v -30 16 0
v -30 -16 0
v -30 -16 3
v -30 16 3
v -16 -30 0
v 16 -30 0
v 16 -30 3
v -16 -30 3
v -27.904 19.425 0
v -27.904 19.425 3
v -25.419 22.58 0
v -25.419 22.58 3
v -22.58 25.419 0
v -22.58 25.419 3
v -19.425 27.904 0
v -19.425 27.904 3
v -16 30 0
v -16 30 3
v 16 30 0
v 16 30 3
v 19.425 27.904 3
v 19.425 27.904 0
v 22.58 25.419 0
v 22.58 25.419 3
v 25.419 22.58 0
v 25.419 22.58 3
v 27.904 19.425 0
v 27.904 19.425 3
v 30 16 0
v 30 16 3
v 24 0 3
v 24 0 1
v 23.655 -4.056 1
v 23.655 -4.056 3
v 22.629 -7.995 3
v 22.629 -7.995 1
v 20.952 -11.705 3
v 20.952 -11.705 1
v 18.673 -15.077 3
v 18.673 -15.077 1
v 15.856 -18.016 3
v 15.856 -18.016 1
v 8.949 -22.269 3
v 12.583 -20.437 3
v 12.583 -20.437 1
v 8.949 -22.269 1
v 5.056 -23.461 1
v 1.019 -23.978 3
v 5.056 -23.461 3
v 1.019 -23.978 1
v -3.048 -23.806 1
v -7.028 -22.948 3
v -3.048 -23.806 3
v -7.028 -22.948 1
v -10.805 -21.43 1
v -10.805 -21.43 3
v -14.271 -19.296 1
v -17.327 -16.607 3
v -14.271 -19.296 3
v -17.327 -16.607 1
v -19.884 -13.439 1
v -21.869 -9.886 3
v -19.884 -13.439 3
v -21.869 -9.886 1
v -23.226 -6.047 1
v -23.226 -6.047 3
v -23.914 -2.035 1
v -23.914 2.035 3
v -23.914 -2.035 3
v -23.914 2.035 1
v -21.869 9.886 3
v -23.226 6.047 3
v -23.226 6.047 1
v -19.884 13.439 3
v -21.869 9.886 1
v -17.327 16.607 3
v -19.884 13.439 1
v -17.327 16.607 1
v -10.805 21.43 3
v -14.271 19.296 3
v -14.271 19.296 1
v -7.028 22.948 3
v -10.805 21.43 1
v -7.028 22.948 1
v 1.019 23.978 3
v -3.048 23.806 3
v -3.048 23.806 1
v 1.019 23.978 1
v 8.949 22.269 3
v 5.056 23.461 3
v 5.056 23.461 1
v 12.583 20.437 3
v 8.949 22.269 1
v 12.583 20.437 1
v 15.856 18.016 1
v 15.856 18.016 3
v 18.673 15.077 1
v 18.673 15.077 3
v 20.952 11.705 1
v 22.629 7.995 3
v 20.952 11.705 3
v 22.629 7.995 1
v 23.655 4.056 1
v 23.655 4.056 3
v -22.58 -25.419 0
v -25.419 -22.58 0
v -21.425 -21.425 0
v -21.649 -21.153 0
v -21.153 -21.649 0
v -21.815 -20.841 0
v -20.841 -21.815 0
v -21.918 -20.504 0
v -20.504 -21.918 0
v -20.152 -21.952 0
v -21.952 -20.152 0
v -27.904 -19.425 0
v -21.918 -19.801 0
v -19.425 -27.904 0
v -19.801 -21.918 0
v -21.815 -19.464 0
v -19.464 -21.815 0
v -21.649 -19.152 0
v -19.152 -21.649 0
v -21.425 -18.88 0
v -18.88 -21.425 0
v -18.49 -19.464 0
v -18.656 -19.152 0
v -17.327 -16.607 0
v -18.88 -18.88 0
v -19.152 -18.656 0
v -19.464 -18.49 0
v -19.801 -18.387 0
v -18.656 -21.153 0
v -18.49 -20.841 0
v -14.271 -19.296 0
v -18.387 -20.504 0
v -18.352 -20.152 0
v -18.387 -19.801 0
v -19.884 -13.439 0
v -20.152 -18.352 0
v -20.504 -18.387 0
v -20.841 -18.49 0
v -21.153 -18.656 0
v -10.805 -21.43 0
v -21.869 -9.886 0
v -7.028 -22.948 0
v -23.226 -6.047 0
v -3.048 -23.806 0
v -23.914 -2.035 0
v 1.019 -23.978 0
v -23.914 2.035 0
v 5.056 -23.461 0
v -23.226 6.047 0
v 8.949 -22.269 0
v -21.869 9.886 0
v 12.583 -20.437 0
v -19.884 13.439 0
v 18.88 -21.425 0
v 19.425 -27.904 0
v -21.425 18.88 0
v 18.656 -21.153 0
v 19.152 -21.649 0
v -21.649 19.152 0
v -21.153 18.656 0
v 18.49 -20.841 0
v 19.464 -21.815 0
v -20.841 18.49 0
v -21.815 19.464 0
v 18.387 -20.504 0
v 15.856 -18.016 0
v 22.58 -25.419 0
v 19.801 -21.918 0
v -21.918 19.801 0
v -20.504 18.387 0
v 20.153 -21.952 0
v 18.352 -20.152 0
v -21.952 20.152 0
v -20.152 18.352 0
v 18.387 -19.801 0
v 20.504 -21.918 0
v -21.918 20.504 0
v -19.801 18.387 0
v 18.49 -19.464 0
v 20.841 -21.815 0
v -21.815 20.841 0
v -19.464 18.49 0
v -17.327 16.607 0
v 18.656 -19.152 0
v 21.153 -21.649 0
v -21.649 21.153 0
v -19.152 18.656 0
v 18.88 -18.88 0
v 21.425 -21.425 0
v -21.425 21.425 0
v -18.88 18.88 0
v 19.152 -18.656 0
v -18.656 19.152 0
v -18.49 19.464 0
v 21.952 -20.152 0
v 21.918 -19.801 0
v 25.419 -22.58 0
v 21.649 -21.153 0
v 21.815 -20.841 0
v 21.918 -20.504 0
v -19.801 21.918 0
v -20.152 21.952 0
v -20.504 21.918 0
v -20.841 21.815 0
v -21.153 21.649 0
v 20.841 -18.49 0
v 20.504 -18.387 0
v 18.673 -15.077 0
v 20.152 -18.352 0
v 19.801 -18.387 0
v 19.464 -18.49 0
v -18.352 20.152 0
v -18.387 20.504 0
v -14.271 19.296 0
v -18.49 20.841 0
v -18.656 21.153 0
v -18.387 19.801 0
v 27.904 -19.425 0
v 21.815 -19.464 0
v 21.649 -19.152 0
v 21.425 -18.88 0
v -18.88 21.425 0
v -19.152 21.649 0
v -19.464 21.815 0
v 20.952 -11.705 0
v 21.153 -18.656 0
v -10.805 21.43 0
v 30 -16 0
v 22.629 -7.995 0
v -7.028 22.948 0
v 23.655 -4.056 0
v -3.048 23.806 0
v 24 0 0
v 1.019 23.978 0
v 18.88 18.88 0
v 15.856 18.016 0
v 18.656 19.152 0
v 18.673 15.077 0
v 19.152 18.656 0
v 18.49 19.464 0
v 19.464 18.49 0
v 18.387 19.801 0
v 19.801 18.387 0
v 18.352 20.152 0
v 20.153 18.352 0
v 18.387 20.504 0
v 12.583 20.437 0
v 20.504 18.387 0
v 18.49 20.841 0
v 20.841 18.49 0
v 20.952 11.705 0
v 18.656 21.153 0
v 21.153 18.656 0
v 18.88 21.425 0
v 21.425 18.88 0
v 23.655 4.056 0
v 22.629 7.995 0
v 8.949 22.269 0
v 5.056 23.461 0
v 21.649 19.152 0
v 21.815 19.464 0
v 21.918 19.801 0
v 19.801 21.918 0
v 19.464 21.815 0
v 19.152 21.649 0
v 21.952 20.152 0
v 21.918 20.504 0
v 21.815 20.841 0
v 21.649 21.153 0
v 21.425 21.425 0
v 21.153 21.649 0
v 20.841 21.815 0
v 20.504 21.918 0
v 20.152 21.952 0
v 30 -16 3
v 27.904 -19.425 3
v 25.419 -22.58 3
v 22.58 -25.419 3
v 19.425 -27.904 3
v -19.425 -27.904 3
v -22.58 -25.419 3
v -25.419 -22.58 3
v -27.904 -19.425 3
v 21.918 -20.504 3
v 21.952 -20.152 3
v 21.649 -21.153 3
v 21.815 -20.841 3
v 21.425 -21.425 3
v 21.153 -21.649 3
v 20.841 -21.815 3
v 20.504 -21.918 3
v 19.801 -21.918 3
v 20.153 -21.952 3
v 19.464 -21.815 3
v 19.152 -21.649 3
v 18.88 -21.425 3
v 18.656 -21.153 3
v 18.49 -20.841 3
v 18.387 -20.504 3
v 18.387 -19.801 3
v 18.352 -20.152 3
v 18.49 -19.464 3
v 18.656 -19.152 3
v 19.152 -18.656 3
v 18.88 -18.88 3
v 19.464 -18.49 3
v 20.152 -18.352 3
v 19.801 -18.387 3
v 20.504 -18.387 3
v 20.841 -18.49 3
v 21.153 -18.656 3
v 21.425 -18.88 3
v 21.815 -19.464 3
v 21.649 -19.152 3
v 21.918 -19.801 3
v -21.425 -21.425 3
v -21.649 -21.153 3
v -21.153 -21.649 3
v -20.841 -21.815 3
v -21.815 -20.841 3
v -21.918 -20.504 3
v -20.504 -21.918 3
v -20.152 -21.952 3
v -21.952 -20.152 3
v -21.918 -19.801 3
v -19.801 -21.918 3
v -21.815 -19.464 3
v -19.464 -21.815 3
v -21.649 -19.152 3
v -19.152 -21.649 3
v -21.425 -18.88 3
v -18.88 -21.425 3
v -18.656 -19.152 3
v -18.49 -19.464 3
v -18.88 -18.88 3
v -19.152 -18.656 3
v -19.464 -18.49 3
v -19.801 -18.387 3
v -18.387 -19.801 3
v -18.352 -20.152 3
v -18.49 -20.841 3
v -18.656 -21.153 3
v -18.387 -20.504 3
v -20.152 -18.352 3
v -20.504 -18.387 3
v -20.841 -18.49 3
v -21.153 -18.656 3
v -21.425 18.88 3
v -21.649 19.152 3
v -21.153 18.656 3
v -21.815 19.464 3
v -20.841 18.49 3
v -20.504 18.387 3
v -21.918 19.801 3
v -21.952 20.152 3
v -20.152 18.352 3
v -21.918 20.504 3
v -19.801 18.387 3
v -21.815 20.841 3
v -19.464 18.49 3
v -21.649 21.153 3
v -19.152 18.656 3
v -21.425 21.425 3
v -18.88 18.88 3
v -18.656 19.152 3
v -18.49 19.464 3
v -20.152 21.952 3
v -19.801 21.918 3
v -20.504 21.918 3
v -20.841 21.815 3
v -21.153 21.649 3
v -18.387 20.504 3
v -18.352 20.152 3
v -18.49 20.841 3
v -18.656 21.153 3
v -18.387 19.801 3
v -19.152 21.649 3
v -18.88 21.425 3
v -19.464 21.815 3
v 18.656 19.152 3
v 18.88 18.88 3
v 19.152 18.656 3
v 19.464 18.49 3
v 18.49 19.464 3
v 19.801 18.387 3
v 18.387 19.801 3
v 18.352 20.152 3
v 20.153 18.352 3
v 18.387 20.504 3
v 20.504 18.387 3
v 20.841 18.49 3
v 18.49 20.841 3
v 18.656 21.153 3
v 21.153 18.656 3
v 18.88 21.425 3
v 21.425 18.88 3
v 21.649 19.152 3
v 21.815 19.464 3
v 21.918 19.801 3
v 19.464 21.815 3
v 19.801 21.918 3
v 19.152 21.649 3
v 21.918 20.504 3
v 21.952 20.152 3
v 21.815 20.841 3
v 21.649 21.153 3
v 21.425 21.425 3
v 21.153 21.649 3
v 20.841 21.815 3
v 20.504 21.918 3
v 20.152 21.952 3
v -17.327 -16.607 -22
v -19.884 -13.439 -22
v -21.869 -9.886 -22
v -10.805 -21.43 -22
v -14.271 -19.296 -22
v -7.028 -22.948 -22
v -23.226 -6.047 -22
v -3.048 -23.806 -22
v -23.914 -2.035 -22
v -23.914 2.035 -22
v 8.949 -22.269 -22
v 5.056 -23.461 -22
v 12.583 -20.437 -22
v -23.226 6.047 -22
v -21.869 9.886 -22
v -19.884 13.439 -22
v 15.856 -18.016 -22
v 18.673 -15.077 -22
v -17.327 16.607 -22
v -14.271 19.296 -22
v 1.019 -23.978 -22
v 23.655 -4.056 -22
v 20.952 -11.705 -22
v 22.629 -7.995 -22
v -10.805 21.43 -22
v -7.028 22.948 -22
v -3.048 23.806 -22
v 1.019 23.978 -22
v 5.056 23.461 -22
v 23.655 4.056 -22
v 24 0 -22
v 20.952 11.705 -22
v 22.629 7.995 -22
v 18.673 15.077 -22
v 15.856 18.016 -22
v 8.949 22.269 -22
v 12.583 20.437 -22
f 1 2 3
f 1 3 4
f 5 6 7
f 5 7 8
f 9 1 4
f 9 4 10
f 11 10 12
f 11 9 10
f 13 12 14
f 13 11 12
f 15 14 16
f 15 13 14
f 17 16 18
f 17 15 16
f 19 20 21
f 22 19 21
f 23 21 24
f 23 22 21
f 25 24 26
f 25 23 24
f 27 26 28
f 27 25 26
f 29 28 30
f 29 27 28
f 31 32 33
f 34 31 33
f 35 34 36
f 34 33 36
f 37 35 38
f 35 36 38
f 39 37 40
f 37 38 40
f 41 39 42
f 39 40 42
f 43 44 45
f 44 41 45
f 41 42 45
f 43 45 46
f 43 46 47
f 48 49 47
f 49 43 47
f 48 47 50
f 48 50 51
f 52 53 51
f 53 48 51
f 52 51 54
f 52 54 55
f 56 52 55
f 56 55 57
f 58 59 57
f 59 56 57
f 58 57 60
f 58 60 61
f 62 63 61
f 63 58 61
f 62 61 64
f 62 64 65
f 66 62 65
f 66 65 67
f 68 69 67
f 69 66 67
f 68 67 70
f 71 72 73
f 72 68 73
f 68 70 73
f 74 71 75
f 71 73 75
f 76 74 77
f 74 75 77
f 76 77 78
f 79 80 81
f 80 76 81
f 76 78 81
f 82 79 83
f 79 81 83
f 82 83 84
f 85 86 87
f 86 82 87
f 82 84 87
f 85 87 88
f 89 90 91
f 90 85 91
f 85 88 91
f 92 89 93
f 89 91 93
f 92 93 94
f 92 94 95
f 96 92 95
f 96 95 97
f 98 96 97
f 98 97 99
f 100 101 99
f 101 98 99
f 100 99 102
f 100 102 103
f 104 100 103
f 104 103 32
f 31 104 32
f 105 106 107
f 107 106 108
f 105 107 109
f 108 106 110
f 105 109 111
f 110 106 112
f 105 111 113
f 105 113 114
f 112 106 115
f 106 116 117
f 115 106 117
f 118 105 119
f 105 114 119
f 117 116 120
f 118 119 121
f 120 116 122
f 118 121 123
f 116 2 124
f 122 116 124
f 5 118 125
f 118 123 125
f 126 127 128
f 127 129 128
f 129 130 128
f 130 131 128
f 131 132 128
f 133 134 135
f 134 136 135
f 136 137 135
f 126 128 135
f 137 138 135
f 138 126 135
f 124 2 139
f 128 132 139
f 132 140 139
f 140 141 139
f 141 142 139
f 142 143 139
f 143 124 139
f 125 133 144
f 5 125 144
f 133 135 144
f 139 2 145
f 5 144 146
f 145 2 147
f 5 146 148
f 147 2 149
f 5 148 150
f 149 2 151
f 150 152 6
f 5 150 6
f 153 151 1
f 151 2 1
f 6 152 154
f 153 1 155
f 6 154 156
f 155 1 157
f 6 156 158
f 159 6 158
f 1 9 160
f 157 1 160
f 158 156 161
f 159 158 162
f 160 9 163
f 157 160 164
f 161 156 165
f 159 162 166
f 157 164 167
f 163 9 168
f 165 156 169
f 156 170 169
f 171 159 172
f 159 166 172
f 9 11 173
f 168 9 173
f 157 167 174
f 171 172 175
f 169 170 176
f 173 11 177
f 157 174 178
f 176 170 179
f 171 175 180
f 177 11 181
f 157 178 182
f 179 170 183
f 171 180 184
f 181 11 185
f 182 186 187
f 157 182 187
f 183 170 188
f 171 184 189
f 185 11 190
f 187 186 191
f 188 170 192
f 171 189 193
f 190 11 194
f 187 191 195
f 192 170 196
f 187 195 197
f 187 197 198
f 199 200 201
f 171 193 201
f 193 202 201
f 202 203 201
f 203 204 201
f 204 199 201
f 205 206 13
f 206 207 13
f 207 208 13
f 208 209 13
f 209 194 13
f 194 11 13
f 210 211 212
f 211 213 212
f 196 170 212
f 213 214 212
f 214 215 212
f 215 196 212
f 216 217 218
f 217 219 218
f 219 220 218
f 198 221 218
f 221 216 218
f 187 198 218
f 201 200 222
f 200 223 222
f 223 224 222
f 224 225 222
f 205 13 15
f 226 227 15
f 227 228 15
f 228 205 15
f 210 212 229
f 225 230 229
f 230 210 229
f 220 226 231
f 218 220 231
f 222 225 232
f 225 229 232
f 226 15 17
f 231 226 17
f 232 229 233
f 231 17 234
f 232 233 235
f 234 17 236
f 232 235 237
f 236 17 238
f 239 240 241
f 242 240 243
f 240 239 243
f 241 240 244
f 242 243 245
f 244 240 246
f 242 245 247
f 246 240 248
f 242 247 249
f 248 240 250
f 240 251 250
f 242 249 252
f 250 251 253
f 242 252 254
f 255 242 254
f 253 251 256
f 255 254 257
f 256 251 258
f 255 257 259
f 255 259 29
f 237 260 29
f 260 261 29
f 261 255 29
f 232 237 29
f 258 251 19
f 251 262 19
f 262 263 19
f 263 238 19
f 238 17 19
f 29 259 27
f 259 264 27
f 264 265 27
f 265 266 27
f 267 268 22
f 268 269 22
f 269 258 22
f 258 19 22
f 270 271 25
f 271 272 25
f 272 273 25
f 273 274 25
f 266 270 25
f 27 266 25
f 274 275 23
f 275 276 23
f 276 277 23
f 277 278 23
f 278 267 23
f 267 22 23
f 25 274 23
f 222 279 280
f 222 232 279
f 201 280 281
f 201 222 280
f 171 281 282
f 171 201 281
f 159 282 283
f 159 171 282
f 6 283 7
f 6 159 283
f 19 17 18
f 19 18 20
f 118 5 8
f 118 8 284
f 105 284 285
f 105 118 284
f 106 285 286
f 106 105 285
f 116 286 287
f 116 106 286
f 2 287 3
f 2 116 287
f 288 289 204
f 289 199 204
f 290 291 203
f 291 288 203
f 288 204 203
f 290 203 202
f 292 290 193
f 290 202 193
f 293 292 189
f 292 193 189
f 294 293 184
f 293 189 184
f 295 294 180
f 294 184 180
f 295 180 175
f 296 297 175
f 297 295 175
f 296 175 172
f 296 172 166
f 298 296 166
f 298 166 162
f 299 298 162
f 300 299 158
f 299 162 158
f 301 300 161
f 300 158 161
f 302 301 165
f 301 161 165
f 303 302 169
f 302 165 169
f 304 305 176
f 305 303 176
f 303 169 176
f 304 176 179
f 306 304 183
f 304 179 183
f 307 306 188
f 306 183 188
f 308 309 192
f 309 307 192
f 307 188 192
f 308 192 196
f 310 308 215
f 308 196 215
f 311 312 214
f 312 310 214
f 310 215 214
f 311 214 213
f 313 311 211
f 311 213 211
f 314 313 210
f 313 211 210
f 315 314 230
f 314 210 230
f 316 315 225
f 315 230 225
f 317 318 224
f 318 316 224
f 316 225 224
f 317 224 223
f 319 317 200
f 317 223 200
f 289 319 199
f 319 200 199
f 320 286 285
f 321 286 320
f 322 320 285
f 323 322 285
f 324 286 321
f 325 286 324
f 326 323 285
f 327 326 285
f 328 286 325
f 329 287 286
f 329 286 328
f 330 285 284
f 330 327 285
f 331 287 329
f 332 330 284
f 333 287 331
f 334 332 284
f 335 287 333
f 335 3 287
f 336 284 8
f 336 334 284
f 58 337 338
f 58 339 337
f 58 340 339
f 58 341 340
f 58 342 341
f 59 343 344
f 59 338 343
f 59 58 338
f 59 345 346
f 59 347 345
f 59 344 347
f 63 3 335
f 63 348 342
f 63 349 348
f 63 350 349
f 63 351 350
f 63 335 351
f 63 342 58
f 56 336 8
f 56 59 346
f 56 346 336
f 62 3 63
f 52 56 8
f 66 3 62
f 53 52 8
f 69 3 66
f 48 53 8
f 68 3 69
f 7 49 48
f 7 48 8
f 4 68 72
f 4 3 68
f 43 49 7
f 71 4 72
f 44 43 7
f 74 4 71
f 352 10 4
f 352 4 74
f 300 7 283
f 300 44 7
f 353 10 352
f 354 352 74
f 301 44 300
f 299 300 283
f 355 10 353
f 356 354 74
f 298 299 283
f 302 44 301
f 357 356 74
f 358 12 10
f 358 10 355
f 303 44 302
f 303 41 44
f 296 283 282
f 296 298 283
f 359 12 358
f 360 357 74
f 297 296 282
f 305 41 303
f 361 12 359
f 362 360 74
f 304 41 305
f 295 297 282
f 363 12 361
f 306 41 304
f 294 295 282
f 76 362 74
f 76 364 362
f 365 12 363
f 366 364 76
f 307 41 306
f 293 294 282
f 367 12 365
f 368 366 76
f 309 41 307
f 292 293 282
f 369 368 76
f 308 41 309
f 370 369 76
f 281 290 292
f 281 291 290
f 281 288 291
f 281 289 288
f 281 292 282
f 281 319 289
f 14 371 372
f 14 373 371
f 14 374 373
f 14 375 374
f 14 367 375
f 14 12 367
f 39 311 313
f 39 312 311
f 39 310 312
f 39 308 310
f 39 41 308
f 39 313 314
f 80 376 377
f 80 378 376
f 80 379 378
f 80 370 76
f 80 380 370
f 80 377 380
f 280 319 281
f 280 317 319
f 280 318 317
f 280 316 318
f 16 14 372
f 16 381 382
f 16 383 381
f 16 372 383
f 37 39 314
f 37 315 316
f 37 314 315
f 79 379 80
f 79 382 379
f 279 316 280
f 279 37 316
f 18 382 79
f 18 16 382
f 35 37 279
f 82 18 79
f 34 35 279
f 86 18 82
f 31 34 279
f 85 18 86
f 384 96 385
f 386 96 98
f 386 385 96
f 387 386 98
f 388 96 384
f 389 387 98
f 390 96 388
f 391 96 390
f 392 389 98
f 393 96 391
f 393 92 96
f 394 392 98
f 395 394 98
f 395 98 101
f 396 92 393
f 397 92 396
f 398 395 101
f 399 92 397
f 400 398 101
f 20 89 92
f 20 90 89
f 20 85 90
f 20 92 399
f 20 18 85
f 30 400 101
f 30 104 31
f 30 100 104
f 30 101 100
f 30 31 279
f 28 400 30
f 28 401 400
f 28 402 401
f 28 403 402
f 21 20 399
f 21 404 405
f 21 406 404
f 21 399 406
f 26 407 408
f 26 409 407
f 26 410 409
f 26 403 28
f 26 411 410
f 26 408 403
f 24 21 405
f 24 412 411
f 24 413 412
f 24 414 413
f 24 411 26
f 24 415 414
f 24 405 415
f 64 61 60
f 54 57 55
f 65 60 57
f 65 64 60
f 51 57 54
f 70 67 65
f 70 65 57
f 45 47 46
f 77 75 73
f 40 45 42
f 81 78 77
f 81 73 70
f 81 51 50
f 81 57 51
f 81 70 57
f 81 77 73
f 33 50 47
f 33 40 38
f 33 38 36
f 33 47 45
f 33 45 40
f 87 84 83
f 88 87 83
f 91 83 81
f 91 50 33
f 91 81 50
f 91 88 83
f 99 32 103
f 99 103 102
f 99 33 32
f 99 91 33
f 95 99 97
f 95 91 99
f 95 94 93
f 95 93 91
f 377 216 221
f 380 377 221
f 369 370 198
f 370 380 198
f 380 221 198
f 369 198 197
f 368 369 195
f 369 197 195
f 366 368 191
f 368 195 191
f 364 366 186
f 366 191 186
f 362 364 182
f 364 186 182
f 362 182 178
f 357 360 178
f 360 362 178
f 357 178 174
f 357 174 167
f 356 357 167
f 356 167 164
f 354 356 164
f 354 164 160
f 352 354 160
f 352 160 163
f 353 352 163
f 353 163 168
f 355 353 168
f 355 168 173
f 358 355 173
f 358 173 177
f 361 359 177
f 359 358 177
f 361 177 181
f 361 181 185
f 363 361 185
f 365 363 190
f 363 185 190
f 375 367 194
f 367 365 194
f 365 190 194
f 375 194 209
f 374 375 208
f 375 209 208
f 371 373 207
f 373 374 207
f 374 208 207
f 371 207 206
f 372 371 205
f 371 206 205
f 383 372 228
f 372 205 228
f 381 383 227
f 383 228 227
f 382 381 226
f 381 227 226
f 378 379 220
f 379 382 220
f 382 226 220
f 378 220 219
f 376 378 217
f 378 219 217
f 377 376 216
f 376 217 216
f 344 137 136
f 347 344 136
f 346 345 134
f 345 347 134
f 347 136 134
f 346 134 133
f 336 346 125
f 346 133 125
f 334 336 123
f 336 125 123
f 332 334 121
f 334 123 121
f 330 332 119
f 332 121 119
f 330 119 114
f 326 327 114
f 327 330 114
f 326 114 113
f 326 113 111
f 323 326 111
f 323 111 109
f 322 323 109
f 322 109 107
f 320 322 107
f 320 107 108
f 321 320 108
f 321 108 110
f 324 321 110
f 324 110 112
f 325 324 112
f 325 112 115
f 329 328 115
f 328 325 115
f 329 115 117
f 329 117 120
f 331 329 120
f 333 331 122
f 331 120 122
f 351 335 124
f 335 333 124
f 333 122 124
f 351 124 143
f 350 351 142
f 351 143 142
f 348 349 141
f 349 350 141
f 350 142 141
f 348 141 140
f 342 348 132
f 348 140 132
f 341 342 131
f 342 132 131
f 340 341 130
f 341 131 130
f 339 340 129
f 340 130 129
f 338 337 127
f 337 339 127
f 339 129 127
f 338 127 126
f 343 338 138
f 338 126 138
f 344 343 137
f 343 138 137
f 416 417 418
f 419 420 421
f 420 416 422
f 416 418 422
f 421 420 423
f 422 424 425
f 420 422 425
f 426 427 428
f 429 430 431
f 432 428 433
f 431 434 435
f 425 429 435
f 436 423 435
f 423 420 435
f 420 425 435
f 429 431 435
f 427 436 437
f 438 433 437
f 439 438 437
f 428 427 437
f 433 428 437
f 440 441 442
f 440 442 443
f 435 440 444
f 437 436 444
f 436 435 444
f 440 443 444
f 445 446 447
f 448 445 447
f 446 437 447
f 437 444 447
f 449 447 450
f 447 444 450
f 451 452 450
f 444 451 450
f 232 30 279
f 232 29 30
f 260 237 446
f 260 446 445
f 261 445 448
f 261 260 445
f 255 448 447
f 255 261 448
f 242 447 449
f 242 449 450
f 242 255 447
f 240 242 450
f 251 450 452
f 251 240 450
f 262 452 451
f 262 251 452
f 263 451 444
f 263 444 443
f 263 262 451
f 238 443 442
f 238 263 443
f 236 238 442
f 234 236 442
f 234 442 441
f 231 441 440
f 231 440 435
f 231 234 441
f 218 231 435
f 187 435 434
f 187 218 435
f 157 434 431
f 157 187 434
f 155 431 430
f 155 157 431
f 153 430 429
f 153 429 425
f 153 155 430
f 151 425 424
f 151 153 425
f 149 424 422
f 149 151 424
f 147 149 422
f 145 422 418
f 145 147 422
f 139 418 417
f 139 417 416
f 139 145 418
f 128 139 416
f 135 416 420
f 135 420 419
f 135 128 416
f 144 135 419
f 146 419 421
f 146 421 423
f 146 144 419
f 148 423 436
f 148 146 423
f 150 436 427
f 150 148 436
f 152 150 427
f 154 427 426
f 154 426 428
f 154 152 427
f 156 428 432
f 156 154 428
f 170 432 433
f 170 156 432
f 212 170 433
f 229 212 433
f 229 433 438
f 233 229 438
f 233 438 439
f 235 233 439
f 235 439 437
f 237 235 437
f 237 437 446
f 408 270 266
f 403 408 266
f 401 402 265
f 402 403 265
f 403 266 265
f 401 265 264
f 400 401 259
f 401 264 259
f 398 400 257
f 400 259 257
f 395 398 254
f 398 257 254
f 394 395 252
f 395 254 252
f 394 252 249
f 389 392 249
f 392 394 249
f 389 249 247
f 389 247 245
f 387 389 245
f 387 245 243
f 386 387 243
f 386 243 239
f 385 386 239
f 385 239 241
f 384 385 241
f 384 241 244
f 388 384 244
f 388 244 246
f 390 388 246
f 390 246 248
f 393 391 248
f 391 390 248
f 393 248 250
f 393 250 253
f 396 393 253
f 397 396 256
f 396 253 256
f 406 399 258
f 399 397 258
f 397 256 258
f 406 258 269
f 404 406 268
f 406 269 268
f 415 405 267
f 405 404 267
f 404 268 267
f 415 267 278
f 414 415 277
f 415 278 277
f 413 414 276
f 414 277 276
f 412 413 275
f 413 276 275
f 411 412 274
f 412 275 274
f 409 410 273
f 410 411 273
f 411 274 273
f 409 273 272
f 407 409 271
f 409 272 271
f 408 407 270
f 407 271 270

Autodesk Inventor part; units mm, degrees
ref_plane "YZ Plane" through (0, 0, 0) normal (1, 0, 0) x (0, 1, 0)
ref_plane "XZ Plane" through (0, 0, 0) normal (0, 1, 0) x (-1, 0, 0)
ref_plane "XY Plane" through (0, 0, 0) normal (0, 0, 1) x (1, 0, 0)
sketch "Sketch1" plane through (0, 0, 0) normal (0, 0, 1) x (1, 0, 0)
  circle A0 centre (0, 0) radius 23.5 construction
  circle A1 centre (0, 0) radius 34 construction
  line L0 (30, 30) -> (-30, 30) construction
  line L1 (-30, 30) -> (-30, -30) construction
  line L2 (-30, -30) -> (30, -30) construction
  line L3 (30, -30) -> (30, 30) construction
  line L4 (30, 30) -> (-30, -30) construction
  line L5 (-30, 30) -> (30, -30) construction
  circle A2 centre (20.1525, 20.1525) radius 4 construction
  circle A3 centre (20.1525, 20.1525) radius 1.8
  arc A4 (30, 16) -> (16, 30) centre (0, 0) ccw
  line L6 (30, 16) -> (30, -16)
  circle A5 centre (0, 0) radius 24
  arc A6 (-16, 30) -> (-30, 16) centre (0, 0) ccw
  line L7 (-16, 30) -> (16, 30)
  circle A7 centre (-20.1525, 20.1525) radius 1.8
  arc A8 (-30, -16) -> (-16, -30) centre (0, 0) ccw
  line L8 (-30, -16) -> (-30, 16)
  circle A9 centre (-20.1525, -20.1525) radius 1.8
  arc A10 (16, -30) -> (30, -16) centre (0, 0) ccw
  line L9 (16, -30) -> (-16, -30)
  circle A11 centre (20.1525, -20.1525) radius 1.8
  line L10 (-35, 35) -> (35, 35)
  line L11 (35, 35) -> (35, -35)
  line L12 (35, -35) -> (-35, -35)
  line L13 (-35, -35) -> (-35, 35)
  line L14 (-35, 35) -> (35, -35) construction
  line L15 (35, 35) -> (-35, -35) construction
  point P0 (-16, -30)
  point P1 (30, -16)
  point P2 (16, 30)
  dimension "d2" = 60
  dimension "d3" = 60
  dimension "d4" = 68
  dimension "d5" = 47
  dimension "d6" = 8
  dimension "d7" = 28.5
  dimension "d8" = 3.6
  dimension "d9" = 48
  dimension "d10" = 360
  dimension "d11" = 70
  dimension "d12" = 70
extrude "Extrusion1" add sketch "Sketch1" along normal blind 3 contours L6 A10 L9 A8 L8 A6 L7 A4
extrude "Extrusion2" add sketch "Sketch1" along normal blind 1 contours A5
extrude "Extrusion3" add sketch "Sketch1" against normal blind 22 contours A5
properties part number "tweetwe"
